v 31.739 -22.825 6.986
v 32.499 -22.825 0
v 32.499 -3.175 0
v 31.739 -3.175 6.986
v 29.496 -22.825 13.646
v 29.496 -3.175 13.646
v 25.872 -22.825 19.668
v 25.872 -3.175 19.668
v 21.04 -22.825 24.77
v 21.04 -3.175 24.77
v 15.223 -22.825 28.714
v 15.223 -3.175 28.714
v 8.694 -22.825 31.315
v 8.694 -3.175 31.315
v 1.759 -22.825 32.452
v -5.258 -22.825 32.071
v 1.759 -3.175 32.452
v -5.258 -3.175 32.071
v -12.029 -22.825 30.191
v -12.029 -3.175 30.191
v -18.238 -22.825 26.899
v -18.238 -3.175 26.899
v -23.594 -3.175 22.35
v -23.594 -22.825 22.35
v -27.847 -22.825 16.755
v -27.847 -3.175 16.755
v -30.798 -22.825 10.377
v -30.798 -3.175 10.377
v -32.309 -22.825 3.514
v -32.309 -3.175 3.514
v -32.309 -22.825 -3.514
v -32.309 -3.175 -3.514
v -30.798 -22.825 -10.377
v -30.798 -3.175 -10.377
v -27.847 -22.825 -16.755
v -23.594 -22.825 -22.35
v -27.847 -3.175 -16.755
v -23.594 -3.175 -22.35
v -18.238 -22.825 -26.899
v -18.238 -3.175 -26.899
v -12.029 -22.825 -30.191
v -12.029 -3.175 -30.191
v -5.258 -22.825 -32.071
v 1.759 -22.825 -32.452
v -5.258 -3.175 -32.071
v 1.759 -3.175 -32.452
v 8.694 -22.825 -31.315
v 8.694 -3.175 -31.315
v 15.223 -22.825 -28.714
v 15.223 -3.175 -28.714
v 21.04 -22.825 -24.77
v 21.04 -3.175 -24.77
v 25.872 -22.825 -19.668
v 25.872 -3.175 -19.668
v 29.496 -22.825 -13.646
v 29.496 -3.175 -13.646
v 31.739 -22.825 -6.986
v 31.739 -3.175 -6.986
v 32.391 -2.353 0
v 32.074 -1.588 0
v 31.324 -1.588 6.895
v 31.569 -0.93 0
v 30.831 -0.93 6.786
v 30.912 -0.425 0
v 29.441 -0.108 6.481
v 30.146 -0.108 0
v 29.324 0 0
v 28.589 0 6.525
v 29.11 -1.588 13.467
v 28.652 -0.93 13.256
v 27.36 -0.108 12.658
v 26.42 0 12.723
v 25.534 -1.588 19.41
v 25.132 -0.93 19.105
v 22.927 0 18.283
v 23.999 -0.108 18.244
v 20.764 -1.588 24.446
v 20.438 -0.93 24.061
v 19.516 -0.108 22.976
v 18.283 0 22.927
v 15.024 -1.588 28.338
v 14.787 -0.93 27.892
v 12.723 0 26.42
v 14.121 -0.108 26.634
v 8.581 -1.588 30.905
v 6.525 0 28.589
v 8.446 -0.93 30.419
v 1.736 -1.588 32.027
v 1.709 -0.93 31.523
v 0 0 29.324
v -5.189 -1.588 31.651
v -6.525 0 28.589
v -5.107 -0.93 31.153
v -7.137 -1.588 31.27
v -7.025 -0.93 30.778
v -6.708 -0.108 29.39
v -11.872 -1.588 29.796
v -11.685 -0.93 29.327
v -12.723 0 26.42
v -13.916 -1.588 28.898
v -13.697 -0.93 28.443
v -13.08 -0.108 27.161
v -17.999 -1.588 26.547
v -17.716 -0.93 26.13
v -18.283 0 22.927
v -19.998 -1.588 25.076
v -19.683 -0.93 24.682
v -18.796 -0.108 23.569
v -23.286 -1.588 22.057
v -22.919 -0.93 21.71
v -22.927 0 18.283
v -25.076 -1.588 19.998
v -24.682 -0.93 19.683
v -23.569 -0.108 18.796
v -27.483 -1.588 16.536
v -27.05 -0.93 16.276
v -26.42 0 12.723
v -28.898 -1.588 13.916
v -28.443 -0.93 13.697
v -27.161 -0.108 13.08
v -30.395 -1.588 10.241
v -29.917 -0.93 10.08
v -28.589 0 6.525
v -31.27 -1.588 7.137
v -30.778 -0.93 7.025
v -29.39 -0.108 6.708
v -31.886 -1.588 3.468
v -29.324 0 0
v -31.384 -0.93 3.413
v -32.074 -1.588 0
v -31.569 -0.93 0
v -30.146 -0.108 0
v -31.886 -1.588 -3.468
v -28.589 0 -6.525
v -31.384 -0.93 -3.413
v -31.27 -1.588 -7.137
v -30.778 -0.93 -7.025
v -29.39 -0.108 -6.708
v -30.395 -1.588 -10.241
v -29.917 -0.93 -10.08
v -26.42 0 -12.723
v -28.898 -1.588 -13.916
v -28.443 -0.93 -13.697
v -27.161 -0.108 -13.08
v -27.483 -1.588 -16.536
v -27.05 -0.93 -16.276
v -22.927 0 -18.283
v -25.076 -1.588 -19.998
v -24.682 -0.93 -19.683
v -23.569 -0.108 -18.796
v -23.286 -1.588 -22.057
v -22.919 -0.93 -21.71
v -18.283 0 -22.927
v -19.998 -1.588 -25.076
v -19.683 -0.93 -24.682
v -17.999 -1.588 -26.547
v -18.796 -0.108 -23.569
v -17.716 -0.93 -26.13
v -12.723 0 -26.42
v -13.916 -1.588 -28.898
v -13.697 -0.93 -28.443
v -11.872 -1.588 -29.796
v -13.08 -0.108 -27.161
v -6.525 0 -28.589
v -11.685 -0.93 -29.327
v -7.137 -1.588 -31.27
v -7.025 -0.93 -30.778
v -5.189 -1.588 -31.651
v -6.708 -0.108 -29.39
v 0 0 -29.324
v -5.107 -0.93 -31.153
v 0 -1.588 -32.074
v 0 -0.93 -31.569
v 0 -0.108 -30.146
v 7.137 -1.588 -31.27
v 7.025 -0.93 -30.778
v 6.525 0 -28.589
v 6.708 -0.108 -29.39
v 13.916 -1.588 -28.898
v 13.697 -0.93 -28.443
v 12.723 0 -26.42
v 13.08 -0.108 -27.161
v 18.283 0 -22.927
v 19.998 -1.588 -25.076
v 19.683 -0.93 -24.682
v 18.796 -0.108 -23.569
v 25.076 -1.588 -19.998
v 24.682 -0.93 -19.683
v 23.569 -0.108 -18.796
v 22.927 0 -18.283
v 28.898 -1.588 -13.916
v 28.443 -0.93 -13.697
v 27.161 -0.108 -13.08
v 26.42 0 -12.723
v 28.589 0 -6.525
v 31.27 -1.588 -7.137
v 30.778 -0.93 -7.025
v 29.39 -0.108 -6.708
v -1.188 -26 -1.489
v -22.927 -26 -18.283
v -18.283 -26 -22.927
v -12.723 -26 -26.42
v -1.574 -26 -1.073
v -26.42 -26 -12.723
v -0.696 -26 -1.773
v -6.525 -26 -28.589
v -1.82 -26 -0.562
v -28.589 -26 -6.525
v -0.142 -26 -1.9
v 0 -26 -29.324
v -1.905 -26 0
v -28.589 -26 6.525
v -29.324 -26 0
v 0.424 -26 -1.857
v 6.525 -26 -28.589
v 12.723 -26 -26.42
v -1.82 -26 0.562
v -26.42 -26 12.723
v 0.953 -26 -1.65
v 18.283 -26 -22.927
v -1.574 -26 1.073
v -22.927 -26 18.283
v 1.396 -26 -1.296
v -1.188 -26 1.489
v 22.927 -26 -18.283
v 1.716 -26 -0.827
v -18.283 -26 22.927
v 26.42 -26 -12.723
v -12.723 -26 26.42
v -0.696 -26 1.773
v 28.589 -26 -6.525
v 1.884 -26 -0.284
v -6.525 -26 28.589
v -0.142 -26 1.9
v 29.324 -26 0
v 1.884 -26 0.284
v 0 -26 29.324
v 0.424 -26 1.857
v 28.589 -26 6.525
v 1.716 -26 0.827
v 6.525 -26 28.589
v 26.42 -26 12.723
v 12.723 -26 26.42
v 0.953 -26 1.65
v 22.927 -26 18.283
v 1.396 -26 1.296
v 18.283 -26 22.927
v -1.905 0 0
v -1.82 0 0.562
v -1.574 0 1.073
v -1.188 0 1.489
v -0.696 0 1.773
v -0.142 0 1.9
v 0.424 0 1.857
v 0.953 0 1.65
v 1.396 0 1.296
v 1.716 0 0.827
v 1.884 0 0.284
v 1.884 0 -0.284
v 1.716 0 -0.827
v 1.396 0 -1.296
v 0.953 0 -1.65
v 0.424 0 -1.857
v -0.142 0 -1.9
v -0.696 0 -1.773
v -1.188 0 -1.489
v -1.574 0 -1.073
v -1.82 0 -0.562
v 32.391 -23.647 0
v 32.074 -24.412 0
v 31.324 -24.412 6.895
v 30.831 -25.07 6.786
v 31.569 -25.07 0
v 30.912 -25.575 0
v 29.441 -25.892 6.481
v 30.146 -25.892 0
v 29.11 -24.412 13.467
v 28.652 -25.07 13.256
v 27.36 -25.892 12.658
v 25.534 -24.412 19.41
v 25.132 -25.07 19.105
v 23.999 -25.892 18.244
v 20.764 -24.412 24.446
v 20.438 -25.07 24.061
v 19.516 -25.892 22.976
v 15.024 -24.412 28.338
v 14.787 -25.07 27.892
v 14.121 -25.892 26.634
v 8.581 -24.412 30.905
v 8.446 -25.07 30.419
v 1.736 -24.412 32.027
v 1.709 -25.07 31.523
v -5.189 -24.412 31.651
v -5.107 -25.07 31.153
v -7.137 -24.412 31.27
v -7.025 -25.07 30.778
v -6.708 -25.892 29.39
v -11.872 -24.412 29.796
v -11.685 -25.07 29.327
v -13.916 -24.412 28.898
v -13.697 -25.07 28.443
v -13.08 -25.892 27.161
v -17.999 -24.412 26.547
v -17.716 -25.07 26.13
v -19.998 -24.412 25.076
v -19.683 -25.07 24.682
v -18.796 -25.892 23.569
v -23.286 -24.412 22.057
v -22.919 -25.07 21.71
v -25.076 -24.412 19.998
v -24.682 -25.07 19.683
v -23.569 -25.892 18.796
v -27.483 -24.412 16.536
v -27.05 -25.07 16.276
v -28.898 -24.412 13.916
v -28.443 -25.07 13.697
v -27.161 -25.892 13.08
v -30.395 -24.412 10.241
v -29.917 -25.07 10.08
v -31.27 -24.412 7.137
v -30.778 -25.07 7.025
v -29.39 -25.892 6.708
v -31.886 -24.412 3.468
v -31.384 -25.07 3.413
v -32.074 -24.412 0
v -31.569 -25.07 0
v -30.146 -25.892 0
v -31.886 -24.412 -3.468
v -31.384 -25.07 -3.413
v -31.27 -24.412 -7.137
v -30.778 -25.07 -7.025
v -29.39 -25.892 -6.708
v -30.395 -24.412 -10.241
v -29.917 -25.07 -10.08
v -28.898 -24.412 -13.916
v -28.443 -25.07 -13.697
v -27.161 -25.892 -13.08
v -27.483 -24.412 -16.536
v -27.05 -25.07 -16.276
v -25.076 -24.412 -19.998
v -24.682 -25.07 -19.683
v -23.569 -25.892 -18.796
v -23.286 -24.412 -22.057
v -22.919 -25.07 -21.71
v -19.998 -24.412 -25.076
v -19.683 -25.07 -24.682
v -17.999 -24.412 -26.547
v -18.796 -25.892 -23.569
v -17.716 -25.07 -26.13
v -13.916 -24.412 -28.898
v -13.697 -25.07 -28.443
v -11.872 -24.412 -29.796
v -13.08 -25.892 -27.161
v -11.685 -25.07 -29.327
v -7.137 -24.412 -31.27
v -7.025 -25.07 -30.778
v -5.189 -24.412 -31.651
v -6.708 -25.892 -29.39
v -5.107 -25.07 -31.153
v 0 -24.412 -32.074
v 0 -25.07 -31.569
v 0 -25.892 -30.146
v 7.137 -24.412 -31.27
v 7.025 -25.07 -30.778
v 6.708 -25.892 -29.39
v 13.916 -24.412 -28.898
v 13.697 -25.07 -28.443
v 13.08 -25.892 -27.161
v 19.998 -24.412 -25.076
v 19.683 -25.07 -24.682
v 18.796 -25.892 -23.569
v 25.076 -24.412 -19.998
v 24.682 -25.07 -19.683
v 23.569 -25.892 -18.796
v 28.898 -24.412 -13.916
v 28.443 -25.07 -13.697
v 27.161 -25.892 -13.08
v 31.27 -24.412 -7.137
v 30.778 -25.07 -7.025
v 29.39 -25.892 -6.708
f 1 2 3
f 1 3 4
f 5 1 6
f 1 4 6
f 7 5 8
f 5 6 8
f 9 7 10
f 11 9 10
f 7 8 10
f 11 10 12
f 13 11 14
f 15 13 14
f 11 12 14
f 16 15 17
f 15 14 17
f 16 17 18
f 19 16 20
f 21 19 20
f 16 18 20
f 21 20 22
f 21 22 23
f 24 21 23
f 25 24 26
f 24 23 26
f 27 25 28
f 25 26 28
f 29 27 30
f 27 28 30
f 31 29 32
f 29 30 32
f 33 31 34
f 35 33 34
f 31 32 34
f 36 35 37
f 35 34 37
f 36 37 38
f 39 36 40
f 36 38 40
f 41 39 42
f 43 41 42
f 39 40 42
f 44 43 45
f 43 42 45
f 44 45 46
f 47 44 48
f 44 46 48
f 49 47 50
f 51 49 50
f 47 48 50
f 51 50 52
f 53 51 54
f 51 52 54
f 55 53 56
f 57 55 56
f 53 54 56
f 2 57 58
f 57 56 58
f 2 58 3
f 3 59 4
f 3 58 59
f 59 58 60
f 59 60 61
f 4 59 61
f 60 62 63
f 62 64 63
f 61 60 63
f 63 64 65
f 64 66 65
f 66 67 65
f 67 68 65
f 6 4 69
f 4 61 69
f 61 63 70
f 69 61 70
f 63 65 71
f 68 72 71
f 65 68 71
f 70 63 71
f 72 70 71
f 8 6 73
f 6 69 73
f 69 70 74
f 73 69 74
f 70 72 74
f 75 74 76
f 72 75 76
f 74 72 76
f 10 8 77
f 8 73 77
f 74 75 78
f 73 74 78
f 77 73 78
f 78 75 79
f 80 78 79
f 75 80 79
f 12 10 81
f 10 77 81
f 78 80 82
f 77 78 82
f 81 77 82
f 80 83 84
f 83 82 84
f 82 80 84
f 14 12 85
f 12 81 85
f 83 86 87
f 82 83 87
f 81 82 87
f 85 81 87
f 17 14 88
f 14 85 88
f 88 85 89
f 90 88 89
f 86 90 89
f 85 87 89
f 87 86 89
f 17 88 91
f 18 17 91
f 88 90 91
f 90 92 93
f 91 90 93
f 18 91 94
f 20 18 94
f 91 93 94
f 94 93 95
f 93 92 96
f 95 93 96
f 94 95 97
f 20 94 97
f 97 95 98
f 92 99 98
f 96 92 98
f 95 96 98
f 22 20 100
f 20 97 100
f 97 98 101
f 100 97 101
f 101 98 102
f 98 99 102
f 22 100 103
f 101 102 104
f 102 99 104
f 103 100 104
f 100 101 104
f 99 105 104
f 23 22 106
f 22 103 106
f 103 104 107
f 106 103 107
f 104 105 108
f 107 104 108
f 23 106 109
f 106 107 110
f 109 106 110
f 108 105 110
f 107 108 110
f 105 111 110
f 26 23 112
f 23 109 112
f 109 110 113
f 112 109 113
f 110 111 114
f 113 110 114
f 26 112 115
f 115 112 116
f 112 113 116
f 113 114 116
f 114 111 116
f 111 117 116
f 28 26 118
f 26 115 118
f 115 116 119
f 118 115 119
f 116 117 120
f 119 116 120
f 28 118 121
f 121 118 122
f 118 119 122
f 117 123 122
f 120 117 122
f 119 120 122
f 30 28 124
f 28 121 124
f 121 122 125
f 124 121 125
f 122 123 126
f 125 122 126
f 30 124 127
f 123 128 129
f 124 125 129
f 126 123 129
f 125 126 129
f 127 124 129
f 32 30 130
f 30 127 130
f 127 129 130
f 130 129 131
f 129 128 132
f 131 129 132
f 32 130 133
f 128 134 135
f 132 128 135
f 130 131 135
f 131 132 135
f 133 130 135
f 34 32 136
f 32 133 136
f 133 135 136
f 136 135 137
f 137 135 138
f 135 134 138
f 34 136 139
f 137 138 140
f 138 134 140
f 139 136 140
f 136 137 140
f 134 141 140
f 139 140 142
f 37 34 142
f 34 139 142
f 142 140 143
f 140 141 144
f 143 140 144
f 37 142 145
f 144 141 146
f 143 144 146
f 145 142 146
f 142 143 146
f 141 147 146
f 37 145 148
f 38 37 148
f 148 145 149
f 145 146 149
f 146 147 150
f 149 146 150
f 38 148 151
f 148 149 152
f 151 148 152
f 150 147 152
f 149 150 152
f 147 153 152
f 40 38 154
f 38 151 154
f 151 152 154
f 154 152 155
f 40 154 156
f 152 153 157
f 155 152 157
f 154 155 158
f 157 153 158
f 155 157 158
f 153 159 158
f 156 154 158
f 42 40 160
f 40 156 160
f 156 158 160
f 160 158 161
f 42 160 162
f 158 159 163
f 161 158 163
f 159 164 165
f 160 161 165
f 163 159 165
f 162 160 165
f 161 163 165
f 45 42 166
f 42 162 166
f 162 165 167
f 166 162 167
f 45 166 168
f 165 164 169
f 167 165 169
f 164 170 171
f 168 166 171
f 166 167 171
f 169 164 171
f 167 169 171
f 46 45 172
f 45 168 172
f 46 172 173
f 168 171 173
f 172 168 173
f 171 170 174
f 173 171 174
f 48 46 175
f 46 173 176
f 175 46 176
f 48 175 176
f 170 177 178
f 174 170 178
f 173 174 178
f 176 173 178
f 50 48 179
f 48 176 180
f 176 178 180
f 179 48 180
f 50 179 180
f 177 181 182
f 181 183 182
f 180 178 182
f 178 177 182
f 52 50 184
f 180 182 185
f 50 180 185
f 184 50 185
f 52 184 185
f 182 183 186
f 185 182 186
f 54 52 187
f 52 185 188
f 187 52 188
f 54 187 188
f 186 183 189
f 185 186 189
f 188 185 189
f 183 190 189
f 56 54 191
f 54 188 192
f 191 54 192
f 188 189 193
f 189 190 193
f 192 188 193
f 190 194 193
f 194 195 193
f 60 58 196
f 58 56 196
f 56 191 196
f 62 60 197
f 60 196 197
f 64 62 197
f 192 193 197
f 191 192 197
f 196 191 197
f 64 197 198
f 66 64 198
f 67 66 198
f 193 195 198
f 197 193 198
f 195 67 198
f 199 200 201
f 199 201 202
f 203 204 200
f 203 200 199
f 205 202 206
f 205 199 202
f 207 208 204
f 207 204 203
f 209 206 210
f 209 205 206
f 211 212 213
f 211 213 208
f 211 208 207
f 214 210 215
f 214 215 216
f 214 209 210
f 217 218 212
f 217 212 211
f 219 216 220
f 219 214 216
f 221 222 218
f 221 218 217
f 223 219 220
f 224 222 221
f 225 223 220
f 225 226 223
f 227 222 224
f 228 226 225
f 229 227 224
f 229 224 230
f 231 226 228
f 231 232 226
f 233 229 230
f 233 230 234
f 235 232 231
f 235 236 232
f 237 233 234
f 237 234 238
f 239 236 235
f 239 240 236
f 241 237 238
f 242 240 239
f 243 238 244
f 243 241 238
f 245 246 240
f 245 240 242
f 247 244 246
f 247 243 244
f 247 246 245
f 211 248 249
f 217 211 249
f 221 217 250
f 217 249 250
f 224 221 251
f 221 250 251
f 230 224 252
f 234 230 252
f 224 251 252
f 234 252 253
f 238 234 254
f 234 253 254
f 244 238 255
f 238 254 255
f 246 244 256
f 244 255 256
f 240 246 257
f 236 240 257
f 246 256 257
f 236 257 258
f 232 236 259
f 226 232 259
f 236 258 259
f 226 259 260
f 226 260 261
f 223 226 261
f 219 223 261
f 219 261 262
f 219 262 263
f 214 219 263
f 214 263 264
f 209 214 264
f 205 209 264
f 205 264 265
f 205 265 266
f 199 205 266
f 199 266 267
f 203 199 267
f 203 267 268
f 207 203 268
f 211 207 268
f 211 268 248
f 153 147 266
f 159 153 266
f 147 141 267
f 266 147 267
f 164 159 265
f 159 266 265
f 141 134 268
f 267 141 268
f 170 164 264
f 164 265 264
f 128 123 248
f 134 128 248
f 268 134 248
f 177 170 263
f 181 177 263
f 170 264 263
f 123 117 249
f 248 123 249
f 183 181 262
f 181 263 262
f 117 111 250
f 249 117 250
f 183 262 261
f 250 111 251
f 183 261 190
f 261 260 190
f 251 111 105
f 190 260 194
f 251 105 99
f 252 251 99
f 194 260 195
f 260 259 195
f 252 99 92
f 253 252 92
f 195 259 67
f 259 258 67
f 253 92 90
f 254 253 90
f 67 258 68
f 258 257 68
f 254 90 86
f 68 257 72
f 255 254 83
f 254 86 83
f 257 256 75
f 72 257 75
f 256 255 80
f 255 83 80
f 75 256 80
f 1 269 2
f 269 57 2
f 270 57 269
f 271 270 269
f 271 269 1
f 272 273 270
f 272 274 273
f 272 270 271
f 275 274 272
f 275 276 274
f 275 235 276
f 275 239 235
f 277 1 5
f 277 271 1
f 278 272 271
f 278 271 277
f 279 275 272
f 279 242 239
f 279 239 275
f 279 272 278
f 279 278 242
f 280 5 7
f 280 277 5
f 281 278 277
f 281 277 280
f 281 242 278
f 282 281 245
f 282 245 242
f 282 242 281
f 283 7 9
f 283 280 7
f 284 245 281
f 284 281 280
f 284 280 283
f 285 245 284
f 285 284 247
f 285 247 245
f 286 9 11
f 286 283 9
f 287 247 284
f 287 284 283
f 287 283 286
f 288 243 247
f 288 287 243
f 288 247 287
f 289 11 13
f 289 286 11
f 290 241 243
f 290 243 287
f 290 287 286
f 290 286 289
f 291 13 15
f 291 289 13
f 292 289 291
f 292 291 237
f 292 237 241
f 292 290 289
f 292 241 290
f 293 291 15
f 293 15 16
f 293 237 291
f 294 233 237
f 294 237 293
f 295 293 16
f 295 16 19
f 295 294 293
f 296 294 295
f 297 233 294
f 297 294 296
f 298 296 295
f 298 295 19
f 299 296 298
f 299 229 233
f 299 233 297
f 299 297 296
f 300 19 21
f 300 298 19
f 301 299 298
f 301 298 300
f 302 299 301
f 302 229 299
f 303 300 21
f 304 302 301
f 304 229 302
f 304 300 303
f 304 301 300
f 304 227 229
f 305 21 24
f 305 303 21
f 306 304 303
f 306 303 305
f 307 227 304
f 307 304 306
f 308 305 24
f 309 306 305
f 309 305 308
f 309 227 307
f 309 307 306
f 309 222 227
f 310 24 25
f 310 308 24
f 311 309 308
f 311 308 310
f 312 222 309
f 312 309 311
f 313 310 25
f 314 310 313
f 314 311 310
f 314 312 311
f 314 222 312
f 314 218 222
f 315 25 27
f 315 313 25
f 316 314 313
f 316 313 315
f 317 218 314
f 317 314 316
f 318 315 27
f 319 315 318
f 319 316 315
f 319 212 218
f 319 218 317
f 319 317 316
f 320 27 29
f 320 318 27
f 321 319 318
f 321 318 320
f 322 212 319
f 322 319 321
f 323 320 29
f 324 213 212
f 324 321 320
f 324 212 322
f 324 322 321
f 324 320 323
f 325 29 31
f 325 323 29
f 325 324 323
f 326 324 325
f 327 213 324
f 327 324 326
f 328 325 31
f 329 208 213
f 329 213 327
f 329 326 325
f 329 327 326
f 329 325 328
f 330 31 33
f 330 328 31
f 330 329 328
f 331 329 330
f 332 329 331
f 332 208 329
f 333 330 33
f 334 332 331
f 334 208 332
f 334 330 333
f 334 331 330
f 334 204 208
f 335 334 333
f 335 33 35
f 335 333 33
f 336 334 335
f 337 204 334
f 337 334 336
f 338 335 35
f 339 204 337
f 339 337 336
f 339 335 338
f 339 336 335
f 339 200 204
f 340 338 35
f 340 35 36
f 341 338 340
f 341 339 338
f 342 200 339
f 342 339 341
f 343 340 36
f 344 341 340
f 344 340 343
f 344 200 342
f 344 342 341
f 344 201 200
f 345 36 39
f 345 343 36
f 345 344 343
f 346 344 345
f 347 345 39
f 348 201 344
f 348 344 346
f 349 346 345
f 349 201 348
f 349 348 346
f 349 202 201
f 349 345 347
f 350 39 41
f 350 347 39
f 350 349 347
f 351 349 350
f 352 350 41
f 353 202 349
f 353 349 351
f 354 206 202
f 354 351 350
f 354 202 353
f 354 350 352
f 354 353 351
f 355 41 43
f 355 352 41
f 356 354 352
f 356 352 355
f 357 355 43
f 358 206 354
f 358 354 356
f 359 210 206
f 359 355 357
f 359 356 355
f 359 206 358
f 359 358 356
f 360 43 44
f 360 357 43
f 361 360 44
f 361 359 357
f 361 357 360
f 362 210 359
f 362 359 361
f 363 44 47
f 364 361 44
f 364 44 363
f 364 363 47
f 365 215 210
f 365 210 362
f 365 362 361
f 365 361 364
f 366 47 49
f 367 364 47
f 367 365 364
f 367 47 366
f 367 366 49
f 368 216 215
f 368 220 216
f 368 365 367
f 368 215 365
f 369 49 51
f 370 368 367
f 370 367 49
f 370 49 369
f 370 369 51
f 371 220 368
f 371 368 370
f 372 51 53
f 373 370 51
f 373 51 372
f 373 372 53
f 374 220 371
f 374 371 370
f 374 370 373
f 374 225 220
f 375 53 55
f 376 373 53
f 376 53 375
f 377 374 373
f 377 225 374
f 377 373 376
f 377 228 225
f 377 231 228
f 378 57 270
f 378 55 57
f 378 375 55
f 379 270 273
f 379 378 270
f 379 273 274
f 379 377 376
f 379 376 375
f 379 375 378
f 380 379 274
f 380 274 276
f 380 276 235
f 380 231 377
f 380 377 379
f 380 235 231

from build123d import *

# Parameters (mm, degrees)
F0_R     = 32.4993
F1_DEPTH = 26
F2_R     = 3.175
F4_D     = 3.81


with BuildPart() as f1:
    # F0 (on Front) → F1 (new body)
    with BuildSketch(Plane.XZ):
        Circle(F0_R)
    extrude(amount=F1_DEPTH)

    # F2
    f2_edges = [f1.edges().sort_by_distance(p)[0] for p in [
        (-32.4993, -26, 0),
        (-32.4993, 0, 0),
    ]]
    fillet(f2_edges, radius=F2_R)

    # F4 (through all)
    with Locations(Plane.XZ.offset(26)):
        with Locations((0, 0)):
            Hole(F4_D / 2)


solid = f1.part
